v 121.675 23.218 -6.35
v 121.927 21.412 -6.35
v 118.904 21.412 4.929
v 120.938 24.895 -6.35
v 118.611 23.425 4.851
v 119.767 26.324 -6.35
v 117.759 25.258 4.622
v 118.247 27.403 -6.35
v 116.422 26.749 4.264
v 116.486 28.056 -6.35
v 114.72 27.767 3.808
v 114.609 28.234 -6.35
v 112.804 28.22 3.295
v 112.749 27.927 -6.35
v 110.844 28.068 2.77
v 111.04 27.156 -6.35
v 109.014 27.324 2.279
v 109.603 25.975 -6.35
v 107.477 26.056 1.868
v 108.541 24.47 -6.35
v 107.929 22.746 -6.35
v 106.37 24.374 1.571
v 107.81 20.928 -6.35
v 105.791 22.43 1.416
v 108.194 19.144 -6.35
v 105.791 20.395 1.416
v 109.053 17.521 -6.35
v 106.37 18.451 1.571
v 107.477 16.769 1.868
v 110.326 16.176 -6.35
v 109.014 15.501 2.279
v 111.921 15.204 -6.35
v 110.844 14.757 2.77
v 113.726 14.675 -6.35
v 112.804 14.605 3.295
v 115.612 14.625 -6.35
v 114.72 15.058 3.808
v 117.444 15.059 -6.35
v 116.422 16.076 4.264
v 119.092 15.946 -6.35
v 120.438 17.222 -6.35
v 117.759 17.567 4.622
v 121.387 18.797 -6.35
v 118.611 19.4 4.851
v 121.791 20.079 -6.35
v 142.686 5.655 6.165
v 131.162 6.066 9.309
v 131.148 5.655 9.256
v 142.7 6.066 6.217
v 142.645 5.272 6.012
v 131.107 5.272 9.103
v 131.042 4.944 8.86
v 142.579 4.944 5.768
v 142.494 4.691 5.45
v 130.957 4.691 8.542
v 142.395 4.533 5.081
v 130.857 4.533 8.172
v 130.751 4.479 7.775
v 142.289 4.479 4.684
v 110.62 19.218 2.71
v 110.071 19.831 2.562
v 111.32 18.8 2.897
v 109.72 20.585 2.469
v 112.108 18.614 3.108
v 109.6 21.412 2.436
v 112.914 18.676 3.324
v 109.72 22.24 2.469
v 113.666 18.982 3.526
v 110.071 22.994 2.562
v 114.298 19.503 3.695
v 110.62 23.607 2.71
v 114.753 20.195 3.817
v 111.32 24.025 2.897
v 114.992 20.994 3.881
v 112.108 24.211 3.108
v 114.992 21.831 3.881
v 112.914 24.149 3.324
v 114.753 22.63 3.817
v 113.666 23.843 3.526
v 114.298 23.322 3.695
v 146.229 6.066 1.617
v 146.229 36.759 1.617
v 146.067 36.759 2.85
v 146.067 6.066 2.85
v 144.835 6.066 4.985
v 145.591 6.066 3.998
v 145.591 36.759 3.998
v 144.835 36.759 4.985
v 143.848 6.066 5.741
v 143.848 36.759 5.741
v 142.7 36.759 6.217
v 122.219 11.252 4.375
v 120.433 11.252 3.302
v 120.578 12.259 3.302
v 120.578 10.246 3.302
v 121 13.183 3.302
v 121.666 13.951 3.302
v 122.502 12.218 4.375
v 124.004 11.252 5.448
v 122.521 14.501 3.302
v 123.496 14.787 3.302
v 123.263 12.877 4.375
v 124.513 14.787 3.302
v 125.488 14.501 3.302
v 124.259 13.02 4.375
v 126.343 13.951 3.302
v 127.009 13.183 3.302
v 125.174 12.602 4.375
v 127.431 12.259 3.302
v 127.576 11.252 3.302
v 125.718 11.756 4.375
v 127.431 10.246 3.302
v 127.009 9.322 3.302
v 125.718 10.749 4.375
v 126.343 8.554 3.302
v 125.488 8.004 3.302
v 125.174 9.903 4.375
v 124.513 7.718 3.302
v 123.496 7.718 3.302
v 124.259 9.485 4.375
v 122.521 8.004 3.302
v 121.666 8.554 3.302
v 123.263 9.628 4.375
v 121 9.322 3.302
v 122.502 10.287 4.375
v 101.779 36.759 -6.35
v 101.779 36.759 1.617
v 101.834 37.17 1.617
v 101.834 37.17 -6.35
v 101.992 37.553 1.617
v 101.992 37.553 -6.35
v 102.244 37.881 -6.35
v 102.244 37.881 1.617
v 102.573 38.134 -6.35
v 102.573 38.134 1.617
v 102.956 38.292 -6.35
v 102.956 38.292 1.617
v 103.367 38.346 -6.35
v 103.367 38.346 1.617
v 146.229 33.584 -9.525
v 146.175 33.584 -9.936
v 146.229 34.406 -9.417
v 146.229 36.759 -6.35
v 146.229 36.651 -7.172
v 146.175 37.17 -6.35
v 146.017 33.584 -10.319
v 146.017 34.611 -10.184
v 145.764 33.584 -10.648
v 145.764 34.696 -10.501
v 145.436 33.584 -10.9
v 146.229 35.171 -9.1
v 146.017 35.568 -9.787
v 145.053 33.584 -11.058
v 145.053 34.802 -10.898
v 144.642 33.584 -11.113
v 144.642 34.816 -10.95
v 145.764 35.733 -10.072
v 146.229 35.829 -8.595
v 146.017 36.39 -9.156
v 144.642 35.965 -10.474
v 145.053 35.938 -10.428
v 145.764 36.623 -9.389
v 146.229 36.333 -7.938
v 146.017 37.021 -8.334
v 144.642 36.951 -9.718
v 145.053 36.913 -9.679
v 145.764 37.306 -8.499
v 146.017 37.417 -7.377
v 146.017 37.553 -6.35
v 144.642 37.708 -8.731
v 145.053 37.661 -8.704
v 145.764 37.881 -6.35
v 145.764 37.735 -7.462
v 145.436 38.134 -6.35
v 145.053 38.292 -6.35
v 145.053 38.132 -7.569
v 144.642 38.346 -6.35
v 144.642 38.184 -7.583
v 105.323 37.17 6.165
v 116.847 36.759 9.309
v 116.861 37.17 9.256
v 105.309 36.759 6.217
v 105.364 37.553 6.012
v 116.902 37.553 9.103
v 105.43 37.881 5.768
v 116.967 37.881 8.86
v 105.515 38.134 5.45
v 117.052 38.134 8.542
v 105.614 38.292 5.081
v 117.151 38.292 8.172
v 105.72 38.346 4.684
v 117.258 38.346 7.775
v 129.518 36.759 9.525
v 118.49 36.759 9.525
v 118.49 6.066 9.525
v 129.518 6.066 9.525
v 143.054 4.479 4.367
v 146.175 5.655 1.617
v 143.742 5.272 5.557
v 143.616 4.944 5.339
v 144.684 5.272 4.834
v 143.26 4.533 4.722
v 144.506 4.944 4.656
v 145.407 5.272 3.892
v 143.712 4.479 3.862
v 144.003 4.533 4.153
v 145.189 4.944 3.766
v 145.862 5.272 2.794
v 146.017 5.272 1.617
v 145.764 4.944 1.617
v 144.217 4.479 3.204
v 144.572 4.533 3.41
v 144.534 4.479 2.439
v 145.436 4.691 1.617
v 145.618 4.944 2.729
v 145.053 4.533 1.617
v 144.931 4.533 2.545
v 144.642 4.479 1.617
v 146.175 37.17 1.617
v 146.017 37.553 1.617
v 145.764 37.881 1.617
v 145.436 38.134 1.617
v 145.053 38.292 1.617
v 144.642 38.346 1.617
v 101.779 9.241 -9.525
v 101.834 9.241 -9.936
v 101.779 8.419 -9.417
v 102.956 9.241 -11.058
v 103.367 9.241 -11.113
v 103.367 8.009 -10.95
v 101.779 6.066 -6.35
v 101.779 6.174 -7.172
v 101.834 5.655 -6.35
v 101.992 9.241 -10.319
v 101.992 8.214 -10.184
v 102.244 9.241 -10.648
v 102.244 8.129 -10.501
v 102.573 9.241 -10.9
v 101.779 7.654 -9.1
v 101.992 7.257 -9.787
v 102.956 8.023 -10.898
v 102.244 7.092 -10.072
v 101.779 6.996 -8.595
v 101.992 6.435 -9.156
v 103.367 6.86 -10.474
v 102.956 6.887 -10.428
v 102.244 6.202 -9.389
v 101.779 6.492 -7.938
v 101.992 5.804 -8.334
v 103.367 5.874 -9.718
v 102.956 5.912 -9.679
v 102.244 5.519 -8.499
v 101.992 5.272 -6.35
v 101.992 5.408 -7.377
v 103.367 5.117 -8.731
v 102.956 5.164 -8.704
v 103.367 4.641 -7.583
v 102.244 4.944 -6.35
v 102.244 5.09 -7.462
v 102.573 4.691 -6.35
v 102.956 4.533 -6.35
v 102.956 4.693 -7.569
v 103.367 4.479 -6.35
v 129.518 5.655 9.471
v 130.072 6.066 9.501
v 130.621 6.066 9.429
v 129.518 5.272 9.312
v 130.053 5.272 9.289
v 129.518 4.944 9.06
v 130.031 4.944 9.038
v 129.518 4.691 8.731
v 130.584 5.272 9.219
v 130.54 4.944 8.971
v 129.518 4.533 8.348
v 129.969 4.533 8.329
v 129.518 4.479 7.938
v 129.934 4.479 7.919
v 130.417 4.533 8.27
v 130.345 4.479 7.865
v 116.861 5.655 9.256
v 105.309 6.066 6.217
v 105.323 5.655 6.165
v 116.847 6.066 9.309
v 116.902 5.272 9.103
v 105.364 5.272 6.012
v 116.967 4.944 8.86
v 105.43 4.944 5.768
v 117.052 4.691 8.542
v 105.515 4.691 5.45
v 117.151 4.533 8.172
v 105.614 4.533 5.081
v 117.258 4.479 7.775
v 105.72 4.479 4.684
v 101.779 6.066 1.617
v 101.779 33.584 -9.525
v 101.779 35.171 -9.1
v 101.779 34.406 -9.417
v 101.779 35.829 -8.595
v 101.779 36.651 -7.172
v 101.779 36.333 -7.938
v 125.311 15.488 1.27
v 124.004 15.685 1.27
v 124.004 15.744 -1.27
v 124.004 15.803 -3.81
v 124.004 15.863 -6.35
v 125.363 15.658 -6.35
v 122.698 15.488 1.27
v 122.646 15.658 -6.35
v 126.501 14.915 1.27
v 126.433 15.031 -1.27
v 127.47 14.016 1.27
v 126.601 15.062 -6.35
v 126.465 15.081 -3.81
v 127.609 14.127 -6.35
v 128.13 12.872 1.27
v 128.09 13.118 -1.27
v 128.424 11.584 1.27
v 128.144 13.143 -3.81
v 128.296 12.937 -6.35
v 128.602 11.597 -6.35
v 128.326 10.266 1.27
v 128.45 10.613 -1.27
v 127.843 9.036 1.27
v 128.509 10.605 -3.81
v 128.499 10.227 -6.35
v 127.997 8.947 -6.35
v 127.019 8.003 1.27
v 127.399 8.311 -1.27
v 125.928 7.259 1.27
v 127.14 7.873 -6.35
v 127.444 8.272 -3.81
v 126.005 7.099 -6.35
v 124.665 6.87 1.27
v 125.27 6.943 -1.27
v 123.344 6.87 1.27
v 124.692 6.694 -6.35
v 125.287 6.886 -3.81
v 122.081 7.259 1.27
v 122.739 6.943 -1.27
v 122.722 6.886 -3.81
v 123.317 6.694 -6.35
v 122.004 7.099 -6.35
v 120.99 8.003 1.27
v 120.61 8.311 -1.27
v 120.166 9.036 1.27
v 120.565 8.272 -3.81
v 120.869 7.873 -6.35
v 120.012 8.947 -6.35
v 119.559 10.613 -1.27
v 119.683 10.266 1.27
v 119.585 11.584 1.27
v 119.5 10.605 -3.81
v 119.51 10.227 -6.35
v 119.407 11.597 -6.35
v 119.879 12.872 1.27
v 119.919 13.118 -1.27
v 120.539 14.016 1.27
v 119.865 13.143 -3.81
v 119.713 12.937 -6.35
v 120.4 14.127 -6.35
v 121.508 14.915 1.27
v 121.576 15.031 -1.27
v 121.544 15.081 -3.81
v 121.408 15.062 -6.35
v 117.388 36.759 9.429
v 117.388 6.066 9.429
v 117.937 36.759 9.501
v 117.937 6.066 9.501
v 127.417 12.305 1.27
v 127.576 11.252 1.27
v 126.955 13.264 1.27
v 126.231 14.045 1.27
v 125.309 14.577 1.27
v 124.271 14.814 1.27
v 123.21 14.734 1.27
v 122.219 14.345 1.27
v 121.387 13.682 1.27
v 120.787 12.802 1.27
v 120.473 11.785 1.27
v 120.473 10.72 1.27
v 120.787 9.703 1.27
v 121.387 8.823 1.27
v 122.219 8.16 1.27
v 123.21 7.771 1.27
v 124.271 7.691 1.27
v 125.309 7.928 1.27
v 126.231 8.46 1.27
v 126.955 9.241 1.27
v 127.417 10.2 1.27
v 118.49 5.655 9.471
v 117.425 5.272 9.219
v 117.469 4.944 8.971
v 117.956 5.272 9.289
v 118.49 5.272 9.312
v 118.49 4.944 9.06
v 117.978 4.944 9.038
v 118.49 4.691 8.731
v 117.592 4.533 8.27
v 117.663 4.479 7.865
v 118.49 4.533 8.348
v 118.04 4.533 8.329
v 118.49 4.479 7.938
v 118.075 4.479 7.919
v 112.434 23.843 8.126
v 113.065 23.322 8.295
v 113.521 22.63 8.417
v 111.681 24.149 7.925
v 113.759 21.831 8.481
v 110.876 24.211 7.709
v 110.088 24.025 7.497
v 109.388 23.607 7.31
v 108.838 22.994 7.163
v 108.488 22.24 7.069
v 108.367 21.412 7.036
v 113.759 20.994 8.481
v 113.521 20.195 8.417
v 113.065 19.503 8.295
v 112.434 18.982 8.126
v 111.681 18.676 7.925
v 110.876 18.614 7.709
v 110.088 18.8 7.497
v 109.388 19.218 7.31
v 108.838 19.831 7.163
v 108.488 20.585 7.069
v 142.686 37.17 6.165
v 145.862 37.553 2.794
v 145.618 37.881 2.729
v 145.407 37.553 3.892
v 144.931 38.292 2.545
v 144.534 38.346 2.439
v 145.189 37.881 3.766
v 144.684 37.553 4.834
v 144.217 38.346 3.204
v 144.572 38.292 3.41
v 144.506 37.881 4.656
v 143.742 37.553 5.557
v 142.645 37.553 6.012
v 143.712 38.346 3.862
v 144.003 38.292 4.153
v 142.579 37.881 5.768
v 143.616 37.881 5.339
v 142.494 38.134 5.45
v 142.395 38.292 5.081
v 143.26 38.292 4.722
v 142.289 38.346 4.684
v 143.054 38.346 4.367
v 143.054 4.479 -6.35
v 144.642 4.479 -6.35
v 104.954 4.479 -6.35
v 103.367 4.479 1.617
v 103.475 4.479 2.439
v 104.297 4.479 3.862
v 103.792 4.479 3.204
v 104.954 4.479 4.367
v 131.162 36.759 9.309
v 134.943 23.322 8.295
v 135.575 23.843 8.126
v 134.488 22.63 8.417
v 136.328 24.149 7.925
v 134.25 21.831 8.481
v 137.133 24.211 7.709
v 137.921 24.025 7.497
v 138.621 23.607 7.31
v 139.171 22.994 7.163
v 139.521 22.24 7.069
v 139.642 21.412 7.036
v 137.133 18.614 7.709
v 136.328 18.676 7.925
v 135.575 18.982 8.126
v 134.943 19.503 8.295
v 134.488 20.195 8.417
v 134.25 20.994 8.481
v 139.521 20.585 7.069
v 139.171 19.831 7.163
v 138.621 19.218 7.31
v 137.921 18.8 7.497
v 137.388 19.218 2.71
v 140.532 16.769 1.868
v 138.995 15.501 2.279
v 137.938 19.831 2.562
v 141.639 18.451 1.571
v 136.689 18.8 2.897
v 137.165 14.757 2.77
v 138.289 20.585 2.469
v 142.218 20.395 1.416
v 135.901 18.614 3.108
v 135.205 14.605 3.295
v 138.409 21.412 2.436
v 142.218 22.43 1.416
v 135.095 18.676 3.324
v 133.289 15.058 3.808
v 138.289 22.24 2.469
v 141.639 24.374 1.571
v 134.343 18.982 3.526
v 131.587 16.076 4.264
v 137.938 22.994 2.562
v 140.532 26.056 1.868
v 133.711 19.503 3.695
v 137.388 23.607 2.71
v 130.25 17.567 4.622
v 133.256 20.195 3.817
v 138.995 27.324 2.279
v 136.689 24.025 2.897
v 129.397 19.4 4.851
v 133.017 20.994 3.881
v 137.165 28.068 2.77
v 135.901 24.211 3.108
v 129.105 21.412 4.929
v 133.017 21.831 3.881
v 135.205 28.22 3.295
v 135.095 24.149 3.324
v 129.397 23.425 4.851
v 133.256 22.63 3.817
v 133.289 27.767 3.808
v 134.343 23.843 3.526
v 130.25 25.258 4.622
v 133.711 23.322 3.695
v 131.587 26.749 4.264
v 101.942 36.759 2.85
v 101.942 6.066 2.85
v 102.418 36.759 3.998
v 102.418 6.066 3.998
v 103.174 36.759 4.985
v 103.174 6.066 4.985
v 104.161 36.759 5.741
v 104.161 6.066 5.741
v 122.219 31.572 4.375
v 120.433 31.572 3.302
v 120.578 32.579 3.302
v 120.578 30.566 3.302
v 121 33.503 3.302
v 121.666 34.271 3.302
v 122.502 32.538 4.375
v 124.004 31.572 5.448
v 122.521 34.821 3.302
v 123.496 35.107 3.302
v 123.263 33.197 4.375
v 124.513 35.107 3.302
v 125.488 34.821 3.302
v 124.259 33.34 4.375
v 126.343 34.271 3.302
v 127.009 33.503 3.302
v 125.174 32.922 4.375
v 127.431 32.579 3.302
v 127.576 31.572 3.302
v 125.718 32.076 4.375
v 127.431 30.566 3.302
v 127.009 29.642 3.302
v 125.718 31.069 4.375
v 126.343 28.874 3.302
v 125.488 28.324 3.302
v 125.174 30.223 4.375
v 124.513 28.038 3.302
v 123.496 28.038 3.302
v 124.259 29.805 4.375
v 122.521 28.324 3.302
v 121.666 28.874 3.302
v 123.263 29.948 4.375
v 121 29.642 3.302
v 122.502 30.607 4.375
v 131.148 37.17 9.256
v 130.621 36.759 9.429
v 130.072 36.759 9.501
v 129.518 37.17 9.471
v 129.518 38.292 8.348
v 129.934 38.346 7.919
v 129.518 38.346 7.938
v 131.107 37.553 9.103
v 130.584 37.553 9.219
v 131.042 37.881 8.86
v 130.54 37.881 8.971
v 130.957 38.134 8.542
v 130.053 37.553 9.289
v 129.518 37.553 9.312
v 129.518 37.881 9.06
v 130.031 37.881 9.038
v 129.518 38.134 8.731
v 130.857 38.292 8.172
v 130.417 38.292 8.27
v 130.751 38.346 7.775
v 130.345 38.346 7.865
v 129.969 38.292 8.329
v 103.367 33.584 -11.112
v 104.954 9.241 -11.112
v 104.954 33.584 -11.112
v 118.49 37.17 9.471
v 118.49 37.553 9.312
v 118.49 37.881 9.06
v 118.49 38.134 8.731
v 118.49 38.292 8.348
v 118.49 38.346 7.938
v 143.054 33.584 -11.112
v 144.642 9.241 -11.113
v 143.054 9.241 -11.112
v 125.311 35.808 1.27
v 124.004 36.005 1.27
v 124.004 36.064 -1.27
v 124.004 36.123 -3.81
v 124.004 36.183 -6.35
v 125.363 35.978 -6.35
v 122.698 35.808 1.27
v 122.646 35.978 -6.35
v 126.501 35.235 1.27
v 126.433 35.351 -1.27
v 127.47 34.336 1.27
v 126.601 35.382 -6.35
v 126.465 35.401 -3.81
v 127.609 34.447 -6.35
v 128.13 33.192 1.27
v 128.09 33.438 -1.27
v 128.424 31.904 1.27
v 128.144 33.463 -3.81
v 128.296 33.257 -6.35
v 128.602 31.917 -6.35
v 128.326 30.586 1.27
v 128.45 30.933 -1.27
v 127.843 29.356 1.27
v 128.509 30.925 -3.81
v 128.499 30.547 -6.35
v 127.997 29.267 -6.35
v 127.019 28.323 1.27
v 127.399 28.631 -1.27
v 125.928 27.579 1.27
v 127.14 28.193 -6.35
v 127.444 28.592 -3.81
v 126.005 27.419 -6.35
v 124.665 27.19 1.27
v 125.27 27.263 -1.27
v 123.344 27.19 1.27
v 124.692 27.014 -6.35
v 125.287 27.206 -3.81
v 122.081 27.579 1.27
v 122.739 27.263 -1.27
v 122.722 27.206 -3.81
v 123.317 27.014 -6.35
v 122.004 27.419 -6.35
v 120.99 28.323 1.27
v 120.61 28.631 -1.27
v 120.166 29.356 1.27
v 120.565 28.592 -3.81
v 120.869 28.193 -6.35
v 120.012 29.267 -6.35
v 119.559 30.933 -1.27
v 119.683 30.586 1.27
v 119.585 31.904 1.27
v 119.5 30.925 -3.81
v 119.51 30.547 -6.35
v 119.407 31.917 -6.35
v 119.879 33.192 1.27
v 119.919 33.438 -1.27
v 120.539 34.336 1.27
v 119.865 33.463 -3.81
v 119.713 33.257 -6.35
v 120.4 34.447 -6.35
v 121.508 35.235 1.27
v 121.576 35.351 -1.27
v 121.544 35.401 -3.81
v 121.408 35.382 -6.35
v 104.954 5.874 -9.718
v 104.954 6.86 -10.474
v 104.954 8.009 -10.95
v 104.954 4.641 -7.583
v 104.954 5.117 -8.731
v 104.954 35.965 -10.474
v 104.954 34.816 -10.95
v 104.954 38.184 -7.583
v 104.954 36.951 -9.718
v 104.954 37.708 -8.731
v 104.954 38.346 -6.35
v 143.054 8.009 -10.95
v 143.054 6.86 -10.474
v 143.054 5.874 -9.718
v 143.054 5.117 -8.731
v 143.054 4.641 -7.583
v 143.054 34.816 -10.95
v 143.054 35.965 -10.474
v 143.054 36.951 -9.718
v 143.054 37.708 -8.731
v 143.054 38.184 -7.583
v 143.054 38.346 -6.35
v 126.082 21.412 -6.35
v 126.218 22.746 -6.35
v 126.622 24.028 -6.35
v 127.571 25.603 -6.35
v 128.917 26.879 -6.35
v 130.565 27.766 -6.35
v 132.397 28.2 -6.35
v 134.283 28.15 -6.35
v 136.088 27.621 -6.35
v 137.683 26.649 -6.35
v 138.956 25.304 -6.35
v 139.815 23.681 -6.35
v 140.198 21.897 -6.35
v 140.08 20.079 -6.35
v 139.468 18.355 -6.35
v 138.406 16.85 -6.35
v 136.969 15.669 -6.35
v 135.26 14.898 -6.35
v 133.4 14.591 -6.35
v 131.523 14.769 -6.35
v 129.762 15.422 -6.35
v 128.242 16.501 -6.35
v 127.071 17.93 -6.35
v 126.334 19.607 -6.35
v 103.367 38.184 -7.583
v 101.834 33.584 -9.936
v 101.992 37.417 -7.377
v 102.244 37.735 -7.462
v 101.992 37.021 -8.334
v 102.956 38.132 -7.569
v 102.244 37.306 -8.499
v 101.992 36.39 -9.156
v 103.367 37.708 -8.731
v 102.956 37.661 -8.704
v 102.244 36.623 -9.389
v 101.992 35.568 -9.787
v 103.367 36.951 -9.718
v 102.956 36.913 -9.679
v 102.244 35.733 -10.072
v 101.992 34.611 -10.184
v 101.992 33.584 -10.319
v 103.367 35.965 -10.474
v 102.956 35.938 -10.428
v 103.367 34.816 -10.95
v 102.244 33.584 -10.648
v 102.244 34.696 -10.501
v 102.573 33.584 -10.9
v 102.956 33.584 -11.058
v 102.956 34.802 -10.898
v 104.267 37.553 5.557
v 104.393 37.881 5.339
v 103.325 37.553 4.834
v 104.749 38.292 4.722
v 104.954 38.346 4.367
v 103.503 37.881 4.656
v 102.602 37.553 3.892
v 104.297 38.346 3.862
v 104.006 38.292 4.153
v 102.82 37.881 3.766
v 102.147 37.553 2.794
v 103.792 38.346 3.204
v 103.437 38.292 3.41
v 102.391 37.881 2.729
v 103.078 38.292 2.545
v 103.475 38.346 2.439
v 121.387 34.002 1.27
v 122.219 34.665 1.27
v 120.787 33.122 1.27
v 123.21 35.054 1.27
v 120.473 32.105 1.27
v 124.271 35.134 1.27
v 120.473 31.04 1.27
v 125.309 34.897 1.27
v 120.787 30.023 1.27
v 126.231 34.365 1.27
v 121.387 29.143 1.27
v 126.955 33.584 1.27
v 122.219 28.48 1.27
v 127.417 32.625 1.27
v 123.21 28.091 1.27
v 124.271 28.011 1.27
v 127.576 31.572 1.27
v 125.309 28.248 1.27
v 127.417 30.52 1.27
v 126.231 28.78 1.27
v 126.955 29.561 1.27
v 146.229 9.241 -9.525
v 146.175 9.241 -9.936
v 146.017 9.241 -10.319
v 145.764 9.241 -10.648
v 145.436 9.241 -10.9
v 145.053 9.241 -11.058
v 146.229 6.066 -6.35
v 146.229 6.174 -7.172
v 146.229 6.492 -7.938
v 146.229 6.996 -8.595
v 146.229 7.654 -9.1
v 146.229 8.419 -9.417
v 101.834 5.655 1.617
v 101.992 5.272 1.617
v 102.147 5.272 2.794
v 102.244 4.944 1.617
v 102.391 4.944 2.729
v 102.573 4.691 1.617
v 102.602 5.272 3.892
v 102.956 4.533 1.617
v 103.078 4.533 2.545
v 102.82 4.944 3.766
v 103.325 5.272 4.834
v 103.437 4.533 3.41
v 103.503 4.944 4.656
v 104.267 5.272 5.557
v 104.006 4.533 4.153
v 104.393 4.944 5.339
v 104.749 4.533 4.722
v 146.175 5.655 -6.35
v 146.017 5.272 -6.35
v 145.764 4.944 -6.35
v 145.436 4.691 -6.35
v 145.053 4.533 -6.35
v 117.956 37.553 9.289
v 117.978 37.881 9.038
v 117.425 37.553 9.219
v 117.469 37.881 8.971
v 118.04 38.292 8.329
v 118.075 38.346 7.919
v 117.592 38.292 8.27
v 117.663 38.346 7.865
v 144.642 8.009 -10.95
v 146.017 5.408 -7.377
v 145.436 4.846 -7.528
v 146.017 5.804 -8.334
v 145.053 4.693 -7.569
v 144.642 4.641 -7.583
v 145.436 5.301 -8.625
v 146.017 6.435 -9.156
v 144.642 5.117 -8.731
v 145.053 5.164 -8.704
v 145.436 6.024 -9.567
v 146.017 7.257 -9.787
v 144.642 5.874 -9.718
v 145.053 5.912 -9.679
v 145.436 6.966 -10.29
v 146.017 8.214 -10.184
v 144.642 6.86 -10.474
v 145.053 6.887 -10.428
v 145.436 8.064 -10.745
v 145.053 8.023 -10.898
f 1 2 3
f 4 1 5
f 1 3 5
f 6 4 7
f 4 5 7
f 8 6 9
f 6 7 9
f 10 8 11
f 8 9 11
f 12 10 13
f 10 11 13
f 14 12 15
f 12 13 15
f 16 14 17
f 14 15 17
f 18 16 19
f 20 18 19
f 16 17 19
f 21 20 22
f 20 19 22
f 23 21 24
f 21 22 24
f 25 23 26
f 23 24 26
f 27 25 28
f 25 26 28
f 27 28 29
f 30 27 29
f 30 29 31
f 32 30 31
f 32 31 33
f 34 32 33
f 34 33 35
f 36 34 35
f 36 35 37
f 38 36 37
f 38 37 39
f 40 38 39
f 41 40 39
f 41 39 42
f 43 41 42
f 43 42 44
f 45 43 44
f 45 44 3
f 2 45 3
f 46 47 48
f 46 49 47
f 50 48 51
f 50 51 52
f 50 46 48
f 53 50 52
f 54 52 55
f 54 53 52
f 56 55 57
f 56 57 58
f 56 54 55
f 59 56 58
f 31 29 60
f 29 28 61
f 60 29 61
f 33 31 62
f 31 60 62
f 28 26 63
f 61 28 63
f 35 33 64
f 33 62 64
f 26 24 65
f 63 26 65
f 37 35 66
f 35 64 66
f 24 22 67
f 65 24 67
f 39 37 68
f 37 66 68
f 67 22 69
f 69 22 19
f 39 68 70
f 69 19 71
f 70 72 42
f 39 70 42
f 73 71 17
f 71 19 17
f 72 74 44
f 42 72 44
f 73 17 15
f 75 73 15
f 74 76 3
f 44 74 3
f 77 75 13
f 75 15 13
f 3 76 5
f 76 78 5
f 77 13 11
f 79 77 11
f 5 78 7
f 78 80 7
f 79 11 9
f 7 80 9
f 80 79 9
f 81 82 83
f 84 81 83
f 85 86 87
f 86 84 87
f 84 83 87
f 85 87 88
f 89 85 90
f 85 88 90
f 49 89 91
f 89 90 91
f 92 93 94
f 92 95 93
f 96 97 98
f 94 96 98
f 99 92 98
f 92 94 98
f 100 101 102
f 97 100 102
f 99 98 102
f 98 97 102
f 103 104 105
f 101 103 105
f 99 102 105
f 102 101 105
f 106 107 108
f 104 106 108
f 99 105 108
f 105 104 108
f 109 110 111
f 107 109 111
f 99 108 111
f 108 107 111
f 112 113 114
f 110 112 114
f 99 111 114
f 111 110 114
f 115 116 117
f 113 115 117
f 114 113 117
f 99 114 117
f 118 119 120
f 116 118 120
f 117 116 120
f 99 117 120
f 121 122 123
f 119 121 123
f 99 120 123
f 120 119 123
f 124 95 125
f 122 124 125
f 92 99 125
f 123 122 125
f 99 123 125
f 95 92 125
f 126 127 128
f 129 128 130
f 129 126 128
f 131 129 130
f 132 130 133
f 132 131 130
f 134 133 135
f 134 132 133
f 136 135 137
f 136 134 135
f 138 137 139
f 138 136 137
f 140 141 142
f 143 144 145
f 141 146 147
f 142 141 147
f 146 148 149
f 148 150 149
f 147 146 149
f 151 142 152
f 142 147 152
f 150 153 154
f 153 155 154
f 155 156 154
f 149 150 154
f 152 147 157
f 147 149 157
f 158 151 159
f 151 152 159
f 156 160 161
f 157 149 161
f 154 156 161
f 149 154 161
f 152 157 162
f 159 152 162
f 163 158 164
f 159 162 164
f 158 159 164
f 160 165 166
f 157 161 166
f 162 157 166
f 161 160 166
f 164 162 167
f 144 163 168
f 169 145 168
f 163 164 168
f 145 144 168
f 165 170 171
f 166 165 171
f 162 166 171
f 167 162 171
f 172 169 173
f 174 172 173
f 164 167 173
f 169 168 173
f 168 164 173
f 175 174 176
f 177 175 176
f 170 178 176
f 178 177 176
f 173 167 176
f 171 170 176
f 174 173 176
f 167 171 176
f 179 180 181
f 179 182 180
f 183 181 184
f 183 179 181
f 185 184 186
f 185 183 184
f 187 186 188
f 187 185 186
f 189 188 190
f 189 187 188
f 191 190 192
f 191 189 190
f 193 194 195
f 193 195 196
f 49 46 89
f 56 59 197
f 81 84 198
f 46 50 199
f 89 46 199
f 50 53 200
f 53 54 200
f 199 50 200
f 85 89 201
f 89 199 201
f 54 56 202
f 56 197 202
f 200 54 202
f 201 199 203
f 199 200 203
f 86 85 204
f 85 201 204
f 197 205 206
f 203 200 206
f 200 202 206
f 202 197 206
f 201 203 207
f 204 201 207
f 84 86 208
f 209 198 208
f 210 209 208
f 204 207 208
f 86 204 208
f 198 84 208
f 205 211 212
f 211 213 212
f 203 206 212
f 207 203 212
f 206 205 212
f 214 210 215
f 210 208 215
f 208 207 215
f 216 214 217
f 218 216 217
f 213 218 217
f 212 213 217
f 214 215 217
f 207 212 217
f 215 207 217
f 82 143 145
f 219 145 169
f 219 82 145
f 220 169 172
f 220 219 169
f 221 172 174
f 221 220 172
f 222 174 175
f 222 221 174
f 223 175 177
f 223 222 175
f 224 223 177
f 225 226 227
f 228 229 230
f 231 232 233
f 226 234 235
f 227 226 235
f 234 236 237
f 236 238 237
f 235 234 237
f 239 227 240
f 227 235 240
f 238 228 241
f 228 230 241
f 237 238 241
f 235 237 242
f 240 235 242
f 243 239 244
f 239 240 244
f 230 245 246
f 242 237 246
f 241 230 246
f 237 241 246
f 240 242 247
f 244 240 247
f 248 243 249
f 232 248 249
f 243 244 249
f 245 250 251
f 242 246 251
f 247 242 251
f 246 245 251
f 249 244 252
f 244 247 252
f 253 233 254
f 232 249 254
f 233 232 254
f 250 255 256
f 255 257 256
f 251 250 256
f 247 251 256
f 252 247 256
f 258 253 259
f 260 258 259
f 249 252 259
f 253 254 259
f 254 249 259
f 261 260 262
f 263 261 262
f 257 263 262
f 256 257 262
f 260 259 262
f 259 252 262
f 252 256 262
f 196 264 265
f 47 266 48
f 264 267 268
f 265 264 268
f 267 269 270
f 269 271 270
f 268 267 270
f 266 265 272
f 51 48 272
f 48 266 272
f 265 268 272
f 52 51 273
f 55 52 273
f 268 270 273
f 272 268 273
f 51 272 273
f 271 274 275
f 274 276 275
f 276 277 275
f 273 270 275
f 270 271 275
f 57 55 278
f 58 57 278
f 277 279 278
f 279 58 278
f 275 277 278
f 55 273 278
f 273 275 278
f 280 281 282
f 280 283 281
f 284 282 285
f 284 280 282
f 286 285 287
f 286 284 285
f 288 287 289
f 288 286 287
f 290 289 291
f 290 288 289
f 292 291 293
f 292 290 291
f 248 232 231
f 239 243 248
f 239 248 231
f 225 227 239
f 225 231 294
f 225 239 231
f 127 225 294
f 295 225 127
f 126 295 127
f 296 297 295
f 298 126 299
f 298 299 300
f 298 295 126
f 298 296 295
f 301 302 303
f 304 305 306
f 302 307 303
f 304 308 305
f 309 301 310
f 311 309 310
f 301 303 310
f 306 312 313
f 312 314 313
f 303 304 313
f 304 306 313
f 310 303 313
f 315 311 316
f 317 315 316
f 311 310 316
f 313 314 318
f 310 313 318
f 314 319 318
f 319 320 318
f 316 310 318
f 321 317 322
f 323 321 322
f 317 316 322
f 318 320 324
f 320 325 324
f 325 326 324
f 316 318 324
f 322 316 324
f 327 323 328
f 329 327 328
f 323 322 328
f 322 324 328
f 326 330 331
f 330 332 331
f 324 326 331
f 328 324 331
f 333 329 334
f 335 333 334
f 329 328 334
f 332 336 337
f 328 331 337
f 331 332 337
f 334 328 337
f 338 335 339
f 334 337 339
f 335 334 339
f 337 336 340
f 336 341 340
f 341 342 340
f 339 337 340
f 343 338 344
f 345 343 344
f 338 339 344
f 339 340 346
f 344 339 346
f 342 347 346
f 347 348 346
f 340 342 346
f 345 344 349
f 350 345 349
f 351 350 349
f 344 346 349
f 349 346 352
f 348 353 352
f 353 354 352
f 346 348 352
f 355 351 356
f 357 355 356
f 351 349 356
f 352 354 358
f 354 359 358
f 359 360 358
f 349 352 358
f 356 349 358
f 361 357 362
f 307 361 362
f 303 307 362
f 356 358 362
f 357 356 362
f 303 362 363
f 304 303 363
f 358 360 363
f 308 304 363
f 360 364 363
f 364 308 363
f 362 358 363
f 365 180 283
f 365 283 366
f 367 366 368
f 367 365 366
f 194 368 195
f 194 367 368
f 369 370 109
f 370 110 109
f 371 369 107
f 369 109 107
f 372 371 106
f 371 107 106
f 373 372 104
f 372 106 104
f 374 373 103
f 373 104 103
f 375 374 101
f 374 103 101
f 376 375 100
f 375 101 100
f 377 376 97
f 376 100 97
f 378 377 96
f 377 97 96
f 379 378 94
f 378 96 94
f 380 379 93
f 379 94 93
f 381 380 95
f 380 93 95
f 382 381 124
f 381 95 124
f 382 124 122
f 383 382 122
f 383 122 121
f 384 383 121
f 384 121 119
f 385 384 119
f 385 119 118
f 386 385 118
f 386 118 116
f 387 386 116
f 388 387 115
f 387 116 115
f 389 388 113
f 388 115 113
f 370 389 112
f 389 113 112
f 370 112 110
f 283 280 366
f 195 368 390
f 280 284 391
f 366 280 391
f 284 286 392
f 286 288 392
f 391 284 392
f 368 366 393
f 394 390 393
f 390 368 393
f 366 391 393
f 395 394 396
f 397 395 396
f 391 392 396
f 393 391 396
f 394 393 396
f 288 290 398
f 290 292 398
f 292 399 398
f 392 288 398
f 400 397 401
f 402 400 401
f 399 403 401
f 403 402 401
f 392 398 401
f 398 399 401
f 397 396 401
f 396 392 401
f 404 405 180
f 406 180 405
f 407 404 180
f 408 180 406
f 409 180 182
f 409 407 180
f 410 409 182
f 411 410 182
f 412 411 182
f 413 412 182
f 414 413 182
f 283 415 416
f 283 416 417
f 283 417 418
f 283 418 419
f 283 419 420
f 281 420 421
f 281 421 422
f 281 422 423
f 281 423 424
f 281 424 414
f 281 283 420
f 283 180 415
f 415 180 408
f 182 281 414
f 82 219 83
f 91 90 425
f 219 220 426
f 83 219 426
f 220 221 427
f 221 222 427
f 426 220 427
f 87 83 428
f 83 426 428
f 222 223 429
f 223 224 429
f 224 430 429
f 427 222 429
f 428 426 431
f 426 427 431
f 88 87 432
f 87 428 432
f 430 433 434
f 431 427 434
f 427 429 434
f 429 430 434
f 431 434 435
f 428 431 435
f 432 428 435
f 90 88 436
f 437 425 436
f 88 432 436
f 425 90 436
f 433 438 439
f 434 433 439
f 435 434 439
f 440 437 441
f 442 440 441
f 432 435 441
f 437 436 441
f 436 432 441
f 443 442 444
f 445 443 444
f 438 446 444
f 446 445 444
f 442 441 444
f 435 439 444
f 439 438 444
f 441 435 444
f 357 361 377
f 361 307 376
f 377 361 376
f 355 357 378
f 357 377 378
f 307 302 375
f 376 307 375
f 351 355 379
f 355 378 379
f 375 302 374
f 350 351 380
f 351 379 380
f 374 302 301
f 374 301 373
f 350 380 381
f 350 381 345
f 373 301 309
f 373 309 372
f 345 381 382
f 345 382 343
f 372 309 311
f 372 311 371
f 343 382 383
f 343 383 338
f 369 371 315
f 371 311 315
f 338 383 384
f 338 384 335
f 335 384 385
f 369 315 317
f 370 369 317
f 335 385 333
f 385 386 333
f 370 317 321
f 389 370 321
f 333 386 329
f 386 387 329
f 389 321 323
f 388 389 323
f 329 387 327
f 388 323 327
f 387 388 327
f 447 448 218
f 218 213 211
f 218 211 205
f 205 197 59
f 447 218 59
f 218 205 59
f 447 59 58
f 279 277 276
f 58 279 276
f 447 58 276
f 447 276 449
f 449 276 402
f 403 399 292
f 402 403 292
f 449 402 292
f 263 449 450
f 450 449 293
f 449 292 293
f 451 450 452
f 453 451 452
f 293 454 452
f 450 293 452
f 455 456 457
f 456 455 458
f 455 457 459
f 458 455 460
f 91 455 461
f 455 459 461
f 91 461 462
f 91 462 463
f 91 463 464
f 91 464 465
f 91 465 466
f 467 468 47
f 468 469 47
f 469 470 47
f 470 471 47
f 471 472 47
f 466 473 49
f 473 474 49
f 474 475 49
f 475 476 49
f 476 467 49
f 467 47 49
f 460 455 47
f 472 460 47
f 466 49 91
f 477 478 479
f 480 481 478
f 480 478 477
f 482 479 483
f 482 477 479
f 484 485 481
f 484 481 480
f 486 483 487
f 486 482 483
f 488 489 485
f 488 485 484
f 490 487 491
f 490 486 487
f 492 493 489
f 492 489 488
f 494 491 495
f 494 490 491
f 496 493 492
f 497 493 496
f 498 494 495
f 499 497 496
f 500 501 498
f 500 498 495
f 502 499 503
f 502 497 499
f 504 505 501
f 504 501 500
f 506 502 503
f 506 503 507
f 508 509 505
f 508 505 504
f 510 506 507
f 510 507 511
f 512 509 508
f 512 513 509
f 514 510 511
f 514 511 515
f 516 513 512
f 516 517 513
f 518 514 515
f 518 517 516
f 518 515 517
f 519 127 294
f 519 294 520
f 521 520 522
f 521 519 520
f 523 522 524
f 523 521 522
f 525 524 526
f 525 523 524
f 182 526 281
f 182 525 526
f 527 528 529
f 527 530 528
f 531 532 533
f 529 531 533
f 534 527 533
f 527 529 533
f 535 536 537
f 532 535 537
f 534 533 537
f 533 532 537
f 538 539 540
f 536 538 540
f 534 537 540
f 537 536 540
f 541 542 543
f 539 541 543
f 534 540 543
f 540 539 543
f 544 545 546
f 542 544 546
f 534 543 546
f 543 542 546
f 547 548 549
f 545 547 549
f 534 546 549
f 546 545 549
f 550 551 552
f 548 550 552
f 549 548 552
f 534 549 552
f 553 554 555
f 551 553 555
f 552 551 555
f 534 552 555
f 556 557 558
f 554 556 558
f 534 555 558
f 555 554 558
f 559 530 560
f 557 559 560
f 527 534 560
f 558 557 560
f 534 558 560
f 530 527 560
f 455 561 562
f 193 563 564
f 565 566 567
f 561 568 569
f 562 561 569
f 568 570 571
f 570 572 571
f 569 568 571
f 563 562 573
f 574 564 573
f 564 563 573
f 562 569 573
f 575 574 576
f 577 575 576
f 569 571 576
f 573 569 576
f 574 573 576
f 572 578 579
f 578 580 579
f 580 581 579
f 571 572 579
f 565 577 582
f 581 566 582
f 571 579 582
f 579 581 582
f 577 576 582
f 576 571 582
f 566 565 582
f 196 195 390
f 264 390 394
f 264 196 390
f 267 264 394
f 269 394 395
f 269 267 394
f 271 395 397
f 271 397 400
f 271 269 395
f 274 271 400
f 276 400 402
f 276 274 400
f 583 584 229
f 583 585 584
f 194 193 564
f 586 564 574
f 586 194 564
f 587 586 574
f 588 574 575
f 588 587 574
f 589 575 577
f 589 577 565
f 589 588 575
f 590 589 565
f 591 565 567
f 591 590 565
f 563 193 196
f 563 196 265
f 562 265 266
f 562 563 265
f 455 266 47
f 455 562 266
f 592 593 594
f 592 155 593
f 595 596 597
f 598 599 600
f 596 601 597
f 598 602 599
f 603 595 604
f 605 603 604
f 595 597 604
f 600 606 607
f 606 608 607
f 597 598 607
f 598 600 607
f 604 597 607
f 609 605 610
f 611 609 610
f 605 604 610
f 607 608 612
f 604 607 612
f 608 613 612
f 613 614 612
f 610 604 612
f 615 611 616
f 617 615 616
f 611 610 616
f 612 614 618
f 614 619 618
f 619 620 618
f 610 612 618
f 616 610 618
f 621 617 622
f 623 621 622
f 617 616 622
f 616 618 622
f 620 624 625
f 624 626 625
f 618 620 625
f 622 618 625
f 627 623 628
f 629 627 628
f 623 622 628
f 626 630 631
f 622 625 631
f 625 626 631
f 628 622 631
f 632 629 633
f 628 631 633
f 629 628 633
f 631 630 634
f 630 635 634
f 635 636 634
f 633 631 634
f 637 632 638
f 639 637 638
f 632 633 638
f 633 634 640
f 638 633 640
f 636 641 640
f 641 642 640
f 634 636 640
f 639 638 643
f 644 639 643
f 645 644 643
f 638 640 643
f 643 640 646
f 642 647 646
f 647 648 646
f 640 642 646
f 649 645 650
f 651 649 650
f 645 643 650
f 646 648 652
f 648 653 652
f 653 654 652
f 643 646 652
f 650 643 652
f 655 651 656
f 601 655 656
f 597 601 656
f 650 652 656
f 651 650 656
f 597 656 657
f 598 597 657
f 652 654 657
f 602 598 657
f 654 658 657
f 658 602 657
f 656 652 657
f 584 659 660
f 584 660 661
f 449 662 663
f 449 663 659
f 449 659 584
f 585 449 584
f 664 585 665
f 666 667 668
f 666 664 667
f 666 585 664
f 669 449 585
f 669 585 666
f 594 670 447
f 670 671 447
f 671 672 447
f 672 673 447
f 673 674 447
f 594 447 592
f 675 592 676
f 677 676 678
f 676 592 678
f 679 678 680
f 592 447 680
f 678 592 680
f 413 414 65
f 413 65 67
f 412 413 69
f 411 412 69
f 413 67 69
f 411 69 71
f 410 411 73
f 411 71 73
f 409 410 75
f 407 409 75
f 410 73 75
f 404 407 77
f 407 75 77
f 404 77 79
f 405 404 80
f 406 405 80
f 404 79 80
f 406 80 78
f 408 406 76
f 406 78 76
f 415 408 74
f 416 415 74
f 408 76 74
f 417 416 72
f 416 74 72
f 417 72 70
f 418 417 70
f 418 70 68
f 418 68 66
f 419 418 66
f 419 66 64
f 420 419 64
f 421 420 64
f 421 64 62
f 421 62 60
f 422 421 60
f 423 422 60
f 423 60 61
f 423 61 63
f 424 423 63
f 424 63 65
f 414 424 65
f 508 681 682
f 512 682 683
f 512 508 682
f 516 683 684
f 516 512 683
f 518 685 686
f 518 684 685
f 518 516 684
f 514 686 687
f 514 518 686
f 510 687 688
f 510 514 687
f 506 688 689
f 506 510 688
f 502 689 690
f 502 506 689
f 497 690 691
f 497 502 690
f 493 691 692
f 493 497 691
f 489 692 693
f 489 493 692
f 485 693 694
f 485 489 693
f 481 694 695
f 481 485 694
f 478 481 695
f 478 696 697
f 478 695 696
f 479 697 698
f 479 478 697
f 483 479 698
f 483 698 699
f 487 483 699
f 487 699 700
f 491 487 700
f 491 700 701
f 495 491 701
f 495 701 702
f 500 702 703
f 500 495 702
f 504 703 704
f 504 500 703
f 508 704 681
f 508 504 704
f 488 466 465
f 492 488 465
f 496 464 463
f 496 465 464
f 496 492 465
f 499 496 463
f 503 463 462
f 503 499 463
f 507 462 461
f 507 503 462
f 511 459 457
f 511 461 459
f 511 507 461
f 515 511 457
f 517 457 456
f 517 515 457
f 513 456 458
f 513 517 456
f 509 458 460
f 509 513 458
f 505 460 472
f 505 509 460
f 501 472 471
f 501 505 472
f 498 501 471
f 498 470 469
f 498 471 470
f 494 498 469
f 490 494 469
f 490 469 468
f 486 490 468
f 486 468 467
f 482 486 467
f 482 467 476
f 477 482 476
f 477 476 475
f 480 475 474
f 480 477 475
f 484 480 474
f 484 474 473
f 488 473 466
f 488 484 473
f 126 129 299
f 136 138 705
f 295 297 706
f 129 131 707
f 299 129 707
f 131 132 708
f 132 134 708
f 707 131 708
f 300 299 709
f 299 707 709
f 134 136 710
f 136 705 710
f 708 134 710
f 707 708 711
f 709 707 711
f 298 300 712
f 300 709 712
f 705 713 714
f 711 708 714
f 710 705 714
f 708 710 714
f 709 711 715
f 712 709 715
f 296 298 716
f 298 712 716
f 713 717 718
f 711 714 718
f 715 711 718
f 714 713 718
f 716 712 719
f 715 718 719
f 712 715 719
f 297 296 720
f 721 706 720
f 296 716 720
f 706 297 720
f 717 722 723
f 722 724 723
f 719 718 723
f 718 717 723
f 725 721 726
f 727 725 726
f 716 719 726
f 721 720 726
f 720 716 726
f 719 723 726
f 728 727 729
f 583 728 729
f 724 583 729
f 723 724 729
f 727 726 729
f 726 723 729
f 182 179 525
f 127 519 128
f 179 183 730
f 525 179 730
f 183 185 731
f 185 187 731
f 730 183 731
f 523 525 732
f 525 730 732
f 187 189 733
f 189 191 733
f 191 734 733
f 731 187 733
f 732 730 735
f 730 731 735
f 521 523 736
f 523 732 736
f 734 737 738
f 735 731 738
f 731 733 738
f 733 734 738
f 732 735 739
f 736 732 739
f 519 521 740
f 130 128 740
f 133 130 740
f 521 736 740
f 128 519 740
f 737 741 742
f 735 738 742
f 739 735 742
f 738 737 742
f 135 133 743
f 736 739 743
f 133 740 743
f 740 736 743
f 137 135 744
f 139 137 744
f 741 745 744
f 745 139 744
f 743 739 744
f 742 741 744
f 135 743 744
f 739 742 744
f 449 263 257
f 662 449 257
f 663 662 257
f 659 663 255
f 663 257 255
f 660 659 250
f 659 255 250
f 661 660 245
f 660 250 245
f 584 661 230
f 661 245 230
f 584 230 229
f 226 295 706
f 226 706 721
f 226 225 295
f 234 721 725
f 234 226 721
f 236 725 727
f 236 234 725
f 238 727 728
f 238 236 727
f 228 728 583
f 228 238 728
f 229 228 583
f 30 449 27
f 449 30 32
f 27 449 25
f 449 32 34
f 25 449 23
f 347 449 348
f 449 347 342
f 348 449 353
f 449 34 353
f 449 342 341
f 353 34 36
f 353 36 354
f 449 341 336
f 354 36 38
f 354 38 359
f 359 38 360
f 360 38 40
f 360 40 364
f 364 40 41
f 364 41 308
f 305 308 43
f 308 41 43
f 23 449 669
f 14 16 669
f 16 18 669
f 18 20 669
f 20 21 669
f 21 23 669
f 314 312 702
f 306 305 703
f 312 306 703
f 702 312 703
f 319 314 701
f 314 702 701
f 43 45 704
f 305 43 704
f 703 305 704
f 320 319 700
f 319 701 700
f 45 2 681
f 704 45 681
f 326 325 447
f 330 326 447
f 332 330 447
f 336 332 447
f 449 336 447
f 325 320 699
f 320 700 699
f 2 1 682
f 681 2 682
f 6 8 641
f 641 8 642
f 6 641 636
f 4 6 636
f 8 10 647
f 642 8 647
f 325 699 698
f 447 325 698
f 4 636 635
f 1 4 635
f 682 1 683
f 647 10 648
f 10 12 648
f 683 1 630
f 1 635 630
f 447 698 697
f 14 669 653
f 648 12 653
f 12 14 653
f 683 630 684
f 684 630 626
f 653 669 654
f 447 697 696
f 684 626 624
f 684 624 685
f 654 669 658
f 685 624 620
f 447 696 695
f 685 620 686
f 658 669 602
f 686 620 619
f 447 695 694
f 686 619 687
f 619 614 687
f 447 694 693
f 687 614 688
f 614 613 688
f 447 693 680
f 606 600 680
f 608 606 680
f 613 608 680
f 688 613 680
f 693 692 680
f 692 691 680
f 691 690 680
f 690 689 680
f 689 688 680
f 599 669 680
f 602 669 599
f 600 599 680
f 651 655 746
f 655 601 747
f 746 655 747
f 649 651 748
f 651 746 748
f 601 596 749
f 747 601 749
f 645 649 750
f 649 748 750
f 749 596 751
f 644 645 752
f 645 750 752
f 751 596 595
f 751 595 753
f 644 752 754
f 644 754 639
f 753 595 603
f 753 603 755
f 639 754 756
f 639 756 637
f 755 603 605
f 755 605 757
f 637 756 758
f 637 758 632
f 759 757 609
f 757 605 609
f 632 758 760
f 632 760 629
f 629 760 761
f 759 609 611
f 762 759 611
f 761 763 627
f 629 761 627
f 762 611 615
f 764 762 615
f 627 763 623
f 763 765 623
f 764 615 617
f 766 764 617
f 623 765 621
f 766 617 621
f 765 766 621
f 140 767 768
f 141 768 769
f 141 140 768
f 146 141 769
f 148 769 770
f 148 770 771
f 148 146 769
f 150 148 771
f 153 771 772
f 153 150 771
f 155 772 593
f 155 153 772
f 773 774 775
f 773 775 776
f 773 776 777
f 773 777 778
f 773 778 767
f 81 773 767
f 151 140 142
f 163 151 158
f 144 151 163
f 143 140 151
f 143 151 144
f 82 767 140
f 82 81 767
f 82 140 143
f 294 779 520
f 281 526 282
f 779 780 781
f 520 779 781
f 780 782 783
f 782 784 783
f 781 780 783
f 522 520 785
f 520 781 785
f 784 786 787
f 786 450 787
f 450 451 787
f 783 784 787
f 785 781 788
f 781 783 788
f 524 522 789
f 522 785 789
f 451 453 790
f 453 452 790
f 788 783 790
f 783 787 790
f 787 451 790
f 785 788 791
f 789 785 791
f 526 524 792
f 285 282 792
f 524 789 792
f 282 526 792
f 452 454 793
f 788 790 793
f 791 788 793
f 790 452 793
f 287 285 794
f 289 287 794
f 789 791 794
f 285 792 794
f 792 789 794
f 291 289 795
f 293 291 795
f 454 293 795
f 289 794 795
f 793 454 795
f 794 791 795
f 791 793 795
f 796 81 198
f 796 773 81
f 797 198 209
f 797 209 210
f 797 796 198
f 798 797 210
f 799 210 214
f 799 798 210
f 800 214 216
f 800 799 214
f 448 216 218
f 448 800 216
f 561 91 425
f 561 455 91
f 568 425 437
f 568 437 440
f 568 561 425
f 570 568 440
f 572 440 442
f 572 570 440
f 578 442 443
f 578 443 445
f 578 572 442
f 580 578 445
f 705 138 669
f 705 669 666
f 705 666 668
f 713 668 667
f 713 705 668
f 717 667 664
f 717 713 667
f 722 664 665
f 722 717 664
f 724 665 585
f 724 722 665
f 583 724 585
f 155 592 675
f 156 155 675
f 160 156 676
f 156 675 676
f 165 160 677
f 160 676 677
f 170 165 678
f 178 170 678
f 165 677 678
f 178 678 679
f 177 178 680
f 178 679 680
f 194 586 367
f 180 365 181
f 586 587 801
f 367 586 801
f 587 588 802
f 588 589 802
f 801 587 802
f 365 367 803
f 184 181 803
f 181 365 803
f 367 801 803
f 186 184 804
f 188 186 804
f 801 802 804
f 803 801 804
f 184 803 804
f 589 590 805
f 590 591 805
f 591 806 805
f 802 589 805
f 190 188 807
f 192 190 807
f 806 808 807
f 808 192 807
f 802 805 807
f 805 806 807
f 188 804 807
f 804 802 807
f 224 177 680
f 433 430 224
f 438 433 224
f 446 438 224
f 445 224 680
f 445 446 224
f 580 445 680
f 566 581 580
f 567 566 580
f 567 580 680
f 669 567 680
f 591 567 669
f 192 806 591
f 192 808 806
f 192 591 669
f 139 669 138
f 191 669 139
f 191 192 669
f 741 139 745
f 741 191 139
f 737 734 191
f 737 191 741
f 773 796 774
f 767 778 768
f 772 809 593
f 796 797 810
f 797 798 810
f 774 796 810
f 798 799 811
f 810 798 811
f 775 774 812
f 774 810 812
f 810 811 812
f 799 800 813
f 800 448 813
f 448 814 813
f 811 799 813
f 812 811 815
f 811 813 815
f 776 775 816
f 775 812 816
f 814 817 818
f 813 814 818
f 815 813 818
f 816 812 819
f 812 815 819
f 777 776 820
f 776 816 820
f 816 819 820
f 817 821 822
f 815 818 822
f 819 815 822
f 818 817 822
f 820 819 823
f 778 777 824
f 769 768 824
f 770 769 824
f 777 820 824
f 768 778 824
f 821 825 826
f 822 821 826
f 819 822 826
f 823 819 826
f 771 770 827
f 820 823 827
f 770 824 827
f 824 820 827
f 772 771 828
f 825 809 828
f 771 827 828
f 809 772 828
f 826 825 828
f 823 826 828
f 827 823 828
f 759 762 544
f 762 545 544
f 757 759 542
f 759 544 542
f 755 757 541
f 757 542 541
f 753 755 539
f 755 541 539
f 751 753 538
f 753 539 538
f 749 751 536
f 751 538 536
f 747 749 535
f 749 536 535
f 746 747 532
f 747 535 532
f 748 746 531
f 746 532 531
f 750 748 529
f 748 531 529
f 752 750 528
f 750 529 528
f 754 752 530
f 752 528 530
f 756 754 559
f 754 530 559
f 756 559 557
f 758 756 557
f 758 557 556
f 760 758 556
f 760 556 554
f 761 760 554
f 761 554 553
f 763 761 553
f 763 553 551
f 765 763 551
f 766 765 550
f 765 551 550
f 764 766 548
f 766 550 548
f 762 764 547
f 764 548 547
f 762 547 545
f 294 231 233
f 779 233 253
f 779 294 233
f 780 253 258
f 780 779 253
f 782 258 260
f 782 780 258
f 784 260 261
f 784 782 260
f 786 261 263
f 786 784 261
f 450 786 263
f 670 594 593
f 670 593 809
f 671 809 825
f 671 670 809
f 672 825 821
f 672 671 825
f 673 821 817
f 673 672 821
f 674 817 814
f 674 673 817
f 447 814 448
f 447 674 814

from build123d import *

# Parameters (mm, degrees)
SKETCH1_W                   = 44.45
SKETCH1_H                   = 33.86758938
SKETCH1_W_2                 = 38.1
SKETCH1_H_2                 = 32.59758938
BOSS_EXTRUDE1_DEPTH         = 6.35
SKETCH2_W                   = 44.45
SKETCH2_H                   = 33.86758938
BOSS_EXTRUDE2_DEPTH         = 9.525
CUT_EXTRUDE1_DEPTH          = 151.402114191
SKETCH4_W                   = 3.175
SKETCH4_H                   = 33.86758938
BOSS_EXTRUDE3_DEPTH         = 4.7625
SHELL2_START                = 9.24120531
SHELL2_DEPTH                = 24.34258938
FILLET4_R                   = 4.7625
FILLET1_R                   = 4.7625
FILLET3_R                   = 6.35
FILLET2_R                   = 1.5875
F_10_CLEARANCE_HOLE1_D      = 5.6134
F_10_CLEARANCE_HOLE1_DEPTH  = 7.802129636
BOSS_EXTRUDE4_REACH         = 152.369
CUT_EXTRUDE2_START          = -4.7625
SKETCH9_R                   = 6.82625
CUT_EXTRUDE2_DEPTH          = 145.161286958
HOLE1_AT_2_COUNT            = 2
HOLE1_AT_2_PITCH            = 20.32
F_1_4_CLEARANCE_HOLE1_D     = 7.14248
F_1_4_CLEARANCE_HOLE1_DEPTH = 9.652
F_1_4_CLEARANCE_HOLE1_TIP   = 2.145817477


# Read off the part's stored shape, not the designer's step: Shell2
with BuildPart() as part:
    # Sketch1 → Boss-Extrude1 (new body)
    with BuildSketch(Plane.XY):
        with Locations((124.004465969, 21.4125)):
            Rectangle(SKETCH1_W, SKETCH1_H)
        with Locations((124.004465969, 21.4125)):
            Rectangle(SKETCH1_W_2, SKETCH1_H_2, mode=Mode.SUBTRACT)
    extrude(amount=-BOSS_EXTRUDE1_DEPTH)

    # Sketch2 → Boss-Extrude2 (add)
    with BuildSketch(Plane.XY):
        with Locations((124.004465969, 21.4125)):
            Rectangle(SKETCH2_W, SKETCH2_H)
    extrude(amount=BOSS_EXTRUDE2_DEPTH)

    # Sketch3 → Cut-Extrude1 (cut, through all)
    with BuildSketch(Plane.XZ.offset(-4.47870531)):
        Polygon((130.354465969, 9.525), (146.229465969, 5.27130657), (146.229465969, 9.525), align=None)
        Polygon((101.779465969, 9.525), (117.654465969, 9.525), (101.779465969, 5.27130657), align=None)
    extrude(amount=-CUT_EXTRUDE1_DEPTH, mode=Mode.SUBTRACT)

    # Sketch4 → Boss-Extrude3 (add)
    with BuildSketch(Plane(origin=(0, 0, -6.35), x_dir=(-1, 0, 0), z_dir=(0, 0, -1))):
        with Locations((-144.641965969, 21.4125)):
            Rectangle(SKETCH4_W, SKETCH4_H)
        with Locations((-103.366965969, 21.4125)):
            Rectangle(SKETCH4_W, SKETCH4_H)
    extrude(amount=BOSS_EXTRUDE3_DEPTH)

    # Shell2 outline → Shell2 (cut)
    with BuildSketch(Plane(origin=(0, 0, 0), x_dir=(1, 0, 0), z_dir=(0, 1, 0)).offset(SHELL2_START)):
        Polygon((141.466965969, 0), (106.541965969, 0), (106.541965969, -1.61691179), (118.281460989, -4.7625), (129.727470949, -4.7625), (141.466965969, -1.61691179), align=None)
    extrude(amount=SHELL2_DEPTH, mode=Mode.SUBTRACT)

    # Fillet4
    fillet4_edges = [part.edges().sort_by_distance(p)[0] for p in [
        (144.641965969, 38.34629469, -11.1125),
        (103.366965969, 38.34629469, -11.1125),
        (144.641965969, 4.47870531, -11.1125),
        (103.366965969, 4.47870531, -11.1125),
    ]]
    fillet(fillet4_edges, radius=FILLET4_R)

    # Fillet1
    fillet1_edges = [part.edges().sort_by_distance(p)[0] for p in [
        (146.229465969, 21.4125, 5.27130657),
        (101.779465969, 21.4125, 5.27130657),
    ]]
    fillet(fillet1_edges, radius=FILLET1_R)

    # Fillet3
    fillet3_edges = [part.edges().sort_by_distance(p)[0] for p in [
        (130.354465969, 21.4125, 9.525),
        (117.654465969, 21.4125, 9.525),
    ]]
    fillet(fillet3_edges, radius=FILLET3_R)

    # Fillet2
    fillet2_edges = [part.edges().sort_by_distance(p)[0] for p in [
        (146.229465969, 21.4125, -11.1125),
        (146.229465969, 4.47870531, -2.366544105),
        (146.229465969, 38.34629469, -2.366544105),
        (146.229465969, 5.873609265, -9.717596045),
        (146.229465969, 36.951390735, -9.717596045),
        (101.779465969, 38.34629469, -2.366544105),
        (101.779465969, 21.4125, -11.1125),
        (101.779465969, 4.47870531, -2.366544105),
        (101.779465969, 5.873609265, -9.717596045),
        (101.779465969, 36.951390735, -9.717596045),
        (111.07814933, 4.47870531, 7.762881267),
        (102.763620686, 4.47870531, 4.516138096),
        (145.245311252, 4.47870531, 4.516138096),
        (111.07814933, 38.34629469, 7.762881267),
        (102.763620686, 38.34629469, 4.516138096),
        (145.245311252, 38.34629469, 4.516138096),
        (124.004465969, 38.34629469, 9.525),
        (124.004465969, 4.47870531, 9.525),
        (136.930782609, 4.47870531, 7.762881267),
        (130.34731393, 4.47870531, 9.47067487),
        (117.661618008, 4.47870531, 9.47067487),
        (136.930782609, 38.34629469, 7.762881267),
        (130.34731393, 38.34629469, 9.47067487),
        (117.661618008, 38.34629469, 9.47067487),
    ]]
    fillet(fillet2_edges, radius=FILLET2_R)

    # #10 Clearance Hole1
    with Locations(Plane(origin=(5.500104786, 0, -20.526670507), x_dir=(0.96592582628907, 0, 0.2588190451025144), z_dir=(-0.2588190451025144, 0, 0.96592582628907))):
        with Locations((109.302434691, 21.4125)):
            f_10_clearance_hole1 = Hole(F_10_CLEARANCE_HOLE1_D / 2, depth=F_10_CLEARANCE_HOLE1_DEPTH)

    # Mirror1: #10 Clearance Hole1 across plane
    add(f_10_clearance_hole1.mirror(Plane(origin=(124.004465969, 0, 0), x_dir=(0, 0, 1), z_dir=(1, 0, 0))), mode=Mode.SUBTRACT)

    # Sketch8 → Boss-Extrude4 (add, up to next)
    with BuildSketch(Plane(origin=(0, 5.11370531, 0), x_dir=(1, 0, 0), z_dir=(0, 1, 0)), mode=Mode.PRIVATE) as boss_extrude4_sk1:
        Polygon((106.541965969, 0), (106.541965969, -1.61691179), (118.281460989, -4.7625), (129.727470949, -4.7625), (141.466965969, -1.61691179), (141.466965969, 0), (143.054465969, 0), (143.054465969, 6.35), (104.954465969, 6.35), (104.954465969, 0), align=None)
    boss_extrude4_tool1 = extrude(boss_extrude4_sk1.sketch, amount=BOSS_EXTRUDE4_REACH, mode=Mode.PRIVATE) - part.part
    add(boss_extrude4_tool1.solids().sort_by_distance((124.004466, 5.113705, -1.371306))[0])

    # Sketch9 → Cut-Extrude2 (cut, through all)
    with BuildSketch(Plane(origin=(5.500104786, 0, -20.526670507), x_dir=(0.96592582628907, 0, 0.2588190451025144), z_dir=(-0.2588190451025144, 0, 0.96592582628907)).offset(CUT_EXTRUDE2_START)):
        with Locations((109.302434691, 21.4125)):
            Circle(SKETCH9_R)
    cut_extrude2 = extrude(amount=-CUT_EXTRUDE2_DEPTH, mode=Mode.SUBTRACT)

    # Mirror2: Cut-Extrude2 across plane
    add(cut_extrude2.mirror(Plane(origin=(124.004465969, 0, 0), x_dir=(0, 0, 1), z_dir=(1, 0, 0))), mode=Mode.SUBTRACT)

    # Sketch12 → Hole1 (revolve, cut)
    with BuildSketch(Plane(origin=(124.004465969, 31.5725, -6.35), x_dir=(0, 1, 0), z_dir=(1, 0, 0))):
        Polygon((0, 0), (0, 7.62), (4.4323, 7.62), (4.6101, 0), align=None)
    hole1 = revolve(axis=Axis((124.004465969, 31.5725, 103.65), (0, 0, -1)), mode=Mode.SUBTRACT)

    # Hole1 at 2: Hole1 ×2
    with Locations(*[(0, -i * HOLE1_AT_2_PITCH, 0) for i in range(1, HOLE1_AT_2_COUNT)]):
        add(hole1, mode=Mode.SUBTRACT)

    # 1/4 Clearance Hole1
    with Locations(Plane(origin=(0, 0, -6.35), x_dir=(-1, 0, 0), z_dir=(0, 0, -1))):
        with Locations((-124.004465969, 11.2525), (-124.004465969, 31.5725)):
            Hole(F_1_4_CLEARANCE_HOLE1_D / 2, depth=F_1_4_CLEARANCE_HOLE1_DEPTH)
            with Locations((0, 0, -(F_1_4_CLEARANCE_HOLE1_DEPTH + F_1_4_CLEARANCE_HOLE1_TIP / 2))):  # 118° drill point
                Cone(0, F_1_4_CLEARANCE_HOLE1_D / 2, F_1_4_CLEARANCE_HOLE1_TIP, mode=Mode.SUBTRACT)


solid = part.part
